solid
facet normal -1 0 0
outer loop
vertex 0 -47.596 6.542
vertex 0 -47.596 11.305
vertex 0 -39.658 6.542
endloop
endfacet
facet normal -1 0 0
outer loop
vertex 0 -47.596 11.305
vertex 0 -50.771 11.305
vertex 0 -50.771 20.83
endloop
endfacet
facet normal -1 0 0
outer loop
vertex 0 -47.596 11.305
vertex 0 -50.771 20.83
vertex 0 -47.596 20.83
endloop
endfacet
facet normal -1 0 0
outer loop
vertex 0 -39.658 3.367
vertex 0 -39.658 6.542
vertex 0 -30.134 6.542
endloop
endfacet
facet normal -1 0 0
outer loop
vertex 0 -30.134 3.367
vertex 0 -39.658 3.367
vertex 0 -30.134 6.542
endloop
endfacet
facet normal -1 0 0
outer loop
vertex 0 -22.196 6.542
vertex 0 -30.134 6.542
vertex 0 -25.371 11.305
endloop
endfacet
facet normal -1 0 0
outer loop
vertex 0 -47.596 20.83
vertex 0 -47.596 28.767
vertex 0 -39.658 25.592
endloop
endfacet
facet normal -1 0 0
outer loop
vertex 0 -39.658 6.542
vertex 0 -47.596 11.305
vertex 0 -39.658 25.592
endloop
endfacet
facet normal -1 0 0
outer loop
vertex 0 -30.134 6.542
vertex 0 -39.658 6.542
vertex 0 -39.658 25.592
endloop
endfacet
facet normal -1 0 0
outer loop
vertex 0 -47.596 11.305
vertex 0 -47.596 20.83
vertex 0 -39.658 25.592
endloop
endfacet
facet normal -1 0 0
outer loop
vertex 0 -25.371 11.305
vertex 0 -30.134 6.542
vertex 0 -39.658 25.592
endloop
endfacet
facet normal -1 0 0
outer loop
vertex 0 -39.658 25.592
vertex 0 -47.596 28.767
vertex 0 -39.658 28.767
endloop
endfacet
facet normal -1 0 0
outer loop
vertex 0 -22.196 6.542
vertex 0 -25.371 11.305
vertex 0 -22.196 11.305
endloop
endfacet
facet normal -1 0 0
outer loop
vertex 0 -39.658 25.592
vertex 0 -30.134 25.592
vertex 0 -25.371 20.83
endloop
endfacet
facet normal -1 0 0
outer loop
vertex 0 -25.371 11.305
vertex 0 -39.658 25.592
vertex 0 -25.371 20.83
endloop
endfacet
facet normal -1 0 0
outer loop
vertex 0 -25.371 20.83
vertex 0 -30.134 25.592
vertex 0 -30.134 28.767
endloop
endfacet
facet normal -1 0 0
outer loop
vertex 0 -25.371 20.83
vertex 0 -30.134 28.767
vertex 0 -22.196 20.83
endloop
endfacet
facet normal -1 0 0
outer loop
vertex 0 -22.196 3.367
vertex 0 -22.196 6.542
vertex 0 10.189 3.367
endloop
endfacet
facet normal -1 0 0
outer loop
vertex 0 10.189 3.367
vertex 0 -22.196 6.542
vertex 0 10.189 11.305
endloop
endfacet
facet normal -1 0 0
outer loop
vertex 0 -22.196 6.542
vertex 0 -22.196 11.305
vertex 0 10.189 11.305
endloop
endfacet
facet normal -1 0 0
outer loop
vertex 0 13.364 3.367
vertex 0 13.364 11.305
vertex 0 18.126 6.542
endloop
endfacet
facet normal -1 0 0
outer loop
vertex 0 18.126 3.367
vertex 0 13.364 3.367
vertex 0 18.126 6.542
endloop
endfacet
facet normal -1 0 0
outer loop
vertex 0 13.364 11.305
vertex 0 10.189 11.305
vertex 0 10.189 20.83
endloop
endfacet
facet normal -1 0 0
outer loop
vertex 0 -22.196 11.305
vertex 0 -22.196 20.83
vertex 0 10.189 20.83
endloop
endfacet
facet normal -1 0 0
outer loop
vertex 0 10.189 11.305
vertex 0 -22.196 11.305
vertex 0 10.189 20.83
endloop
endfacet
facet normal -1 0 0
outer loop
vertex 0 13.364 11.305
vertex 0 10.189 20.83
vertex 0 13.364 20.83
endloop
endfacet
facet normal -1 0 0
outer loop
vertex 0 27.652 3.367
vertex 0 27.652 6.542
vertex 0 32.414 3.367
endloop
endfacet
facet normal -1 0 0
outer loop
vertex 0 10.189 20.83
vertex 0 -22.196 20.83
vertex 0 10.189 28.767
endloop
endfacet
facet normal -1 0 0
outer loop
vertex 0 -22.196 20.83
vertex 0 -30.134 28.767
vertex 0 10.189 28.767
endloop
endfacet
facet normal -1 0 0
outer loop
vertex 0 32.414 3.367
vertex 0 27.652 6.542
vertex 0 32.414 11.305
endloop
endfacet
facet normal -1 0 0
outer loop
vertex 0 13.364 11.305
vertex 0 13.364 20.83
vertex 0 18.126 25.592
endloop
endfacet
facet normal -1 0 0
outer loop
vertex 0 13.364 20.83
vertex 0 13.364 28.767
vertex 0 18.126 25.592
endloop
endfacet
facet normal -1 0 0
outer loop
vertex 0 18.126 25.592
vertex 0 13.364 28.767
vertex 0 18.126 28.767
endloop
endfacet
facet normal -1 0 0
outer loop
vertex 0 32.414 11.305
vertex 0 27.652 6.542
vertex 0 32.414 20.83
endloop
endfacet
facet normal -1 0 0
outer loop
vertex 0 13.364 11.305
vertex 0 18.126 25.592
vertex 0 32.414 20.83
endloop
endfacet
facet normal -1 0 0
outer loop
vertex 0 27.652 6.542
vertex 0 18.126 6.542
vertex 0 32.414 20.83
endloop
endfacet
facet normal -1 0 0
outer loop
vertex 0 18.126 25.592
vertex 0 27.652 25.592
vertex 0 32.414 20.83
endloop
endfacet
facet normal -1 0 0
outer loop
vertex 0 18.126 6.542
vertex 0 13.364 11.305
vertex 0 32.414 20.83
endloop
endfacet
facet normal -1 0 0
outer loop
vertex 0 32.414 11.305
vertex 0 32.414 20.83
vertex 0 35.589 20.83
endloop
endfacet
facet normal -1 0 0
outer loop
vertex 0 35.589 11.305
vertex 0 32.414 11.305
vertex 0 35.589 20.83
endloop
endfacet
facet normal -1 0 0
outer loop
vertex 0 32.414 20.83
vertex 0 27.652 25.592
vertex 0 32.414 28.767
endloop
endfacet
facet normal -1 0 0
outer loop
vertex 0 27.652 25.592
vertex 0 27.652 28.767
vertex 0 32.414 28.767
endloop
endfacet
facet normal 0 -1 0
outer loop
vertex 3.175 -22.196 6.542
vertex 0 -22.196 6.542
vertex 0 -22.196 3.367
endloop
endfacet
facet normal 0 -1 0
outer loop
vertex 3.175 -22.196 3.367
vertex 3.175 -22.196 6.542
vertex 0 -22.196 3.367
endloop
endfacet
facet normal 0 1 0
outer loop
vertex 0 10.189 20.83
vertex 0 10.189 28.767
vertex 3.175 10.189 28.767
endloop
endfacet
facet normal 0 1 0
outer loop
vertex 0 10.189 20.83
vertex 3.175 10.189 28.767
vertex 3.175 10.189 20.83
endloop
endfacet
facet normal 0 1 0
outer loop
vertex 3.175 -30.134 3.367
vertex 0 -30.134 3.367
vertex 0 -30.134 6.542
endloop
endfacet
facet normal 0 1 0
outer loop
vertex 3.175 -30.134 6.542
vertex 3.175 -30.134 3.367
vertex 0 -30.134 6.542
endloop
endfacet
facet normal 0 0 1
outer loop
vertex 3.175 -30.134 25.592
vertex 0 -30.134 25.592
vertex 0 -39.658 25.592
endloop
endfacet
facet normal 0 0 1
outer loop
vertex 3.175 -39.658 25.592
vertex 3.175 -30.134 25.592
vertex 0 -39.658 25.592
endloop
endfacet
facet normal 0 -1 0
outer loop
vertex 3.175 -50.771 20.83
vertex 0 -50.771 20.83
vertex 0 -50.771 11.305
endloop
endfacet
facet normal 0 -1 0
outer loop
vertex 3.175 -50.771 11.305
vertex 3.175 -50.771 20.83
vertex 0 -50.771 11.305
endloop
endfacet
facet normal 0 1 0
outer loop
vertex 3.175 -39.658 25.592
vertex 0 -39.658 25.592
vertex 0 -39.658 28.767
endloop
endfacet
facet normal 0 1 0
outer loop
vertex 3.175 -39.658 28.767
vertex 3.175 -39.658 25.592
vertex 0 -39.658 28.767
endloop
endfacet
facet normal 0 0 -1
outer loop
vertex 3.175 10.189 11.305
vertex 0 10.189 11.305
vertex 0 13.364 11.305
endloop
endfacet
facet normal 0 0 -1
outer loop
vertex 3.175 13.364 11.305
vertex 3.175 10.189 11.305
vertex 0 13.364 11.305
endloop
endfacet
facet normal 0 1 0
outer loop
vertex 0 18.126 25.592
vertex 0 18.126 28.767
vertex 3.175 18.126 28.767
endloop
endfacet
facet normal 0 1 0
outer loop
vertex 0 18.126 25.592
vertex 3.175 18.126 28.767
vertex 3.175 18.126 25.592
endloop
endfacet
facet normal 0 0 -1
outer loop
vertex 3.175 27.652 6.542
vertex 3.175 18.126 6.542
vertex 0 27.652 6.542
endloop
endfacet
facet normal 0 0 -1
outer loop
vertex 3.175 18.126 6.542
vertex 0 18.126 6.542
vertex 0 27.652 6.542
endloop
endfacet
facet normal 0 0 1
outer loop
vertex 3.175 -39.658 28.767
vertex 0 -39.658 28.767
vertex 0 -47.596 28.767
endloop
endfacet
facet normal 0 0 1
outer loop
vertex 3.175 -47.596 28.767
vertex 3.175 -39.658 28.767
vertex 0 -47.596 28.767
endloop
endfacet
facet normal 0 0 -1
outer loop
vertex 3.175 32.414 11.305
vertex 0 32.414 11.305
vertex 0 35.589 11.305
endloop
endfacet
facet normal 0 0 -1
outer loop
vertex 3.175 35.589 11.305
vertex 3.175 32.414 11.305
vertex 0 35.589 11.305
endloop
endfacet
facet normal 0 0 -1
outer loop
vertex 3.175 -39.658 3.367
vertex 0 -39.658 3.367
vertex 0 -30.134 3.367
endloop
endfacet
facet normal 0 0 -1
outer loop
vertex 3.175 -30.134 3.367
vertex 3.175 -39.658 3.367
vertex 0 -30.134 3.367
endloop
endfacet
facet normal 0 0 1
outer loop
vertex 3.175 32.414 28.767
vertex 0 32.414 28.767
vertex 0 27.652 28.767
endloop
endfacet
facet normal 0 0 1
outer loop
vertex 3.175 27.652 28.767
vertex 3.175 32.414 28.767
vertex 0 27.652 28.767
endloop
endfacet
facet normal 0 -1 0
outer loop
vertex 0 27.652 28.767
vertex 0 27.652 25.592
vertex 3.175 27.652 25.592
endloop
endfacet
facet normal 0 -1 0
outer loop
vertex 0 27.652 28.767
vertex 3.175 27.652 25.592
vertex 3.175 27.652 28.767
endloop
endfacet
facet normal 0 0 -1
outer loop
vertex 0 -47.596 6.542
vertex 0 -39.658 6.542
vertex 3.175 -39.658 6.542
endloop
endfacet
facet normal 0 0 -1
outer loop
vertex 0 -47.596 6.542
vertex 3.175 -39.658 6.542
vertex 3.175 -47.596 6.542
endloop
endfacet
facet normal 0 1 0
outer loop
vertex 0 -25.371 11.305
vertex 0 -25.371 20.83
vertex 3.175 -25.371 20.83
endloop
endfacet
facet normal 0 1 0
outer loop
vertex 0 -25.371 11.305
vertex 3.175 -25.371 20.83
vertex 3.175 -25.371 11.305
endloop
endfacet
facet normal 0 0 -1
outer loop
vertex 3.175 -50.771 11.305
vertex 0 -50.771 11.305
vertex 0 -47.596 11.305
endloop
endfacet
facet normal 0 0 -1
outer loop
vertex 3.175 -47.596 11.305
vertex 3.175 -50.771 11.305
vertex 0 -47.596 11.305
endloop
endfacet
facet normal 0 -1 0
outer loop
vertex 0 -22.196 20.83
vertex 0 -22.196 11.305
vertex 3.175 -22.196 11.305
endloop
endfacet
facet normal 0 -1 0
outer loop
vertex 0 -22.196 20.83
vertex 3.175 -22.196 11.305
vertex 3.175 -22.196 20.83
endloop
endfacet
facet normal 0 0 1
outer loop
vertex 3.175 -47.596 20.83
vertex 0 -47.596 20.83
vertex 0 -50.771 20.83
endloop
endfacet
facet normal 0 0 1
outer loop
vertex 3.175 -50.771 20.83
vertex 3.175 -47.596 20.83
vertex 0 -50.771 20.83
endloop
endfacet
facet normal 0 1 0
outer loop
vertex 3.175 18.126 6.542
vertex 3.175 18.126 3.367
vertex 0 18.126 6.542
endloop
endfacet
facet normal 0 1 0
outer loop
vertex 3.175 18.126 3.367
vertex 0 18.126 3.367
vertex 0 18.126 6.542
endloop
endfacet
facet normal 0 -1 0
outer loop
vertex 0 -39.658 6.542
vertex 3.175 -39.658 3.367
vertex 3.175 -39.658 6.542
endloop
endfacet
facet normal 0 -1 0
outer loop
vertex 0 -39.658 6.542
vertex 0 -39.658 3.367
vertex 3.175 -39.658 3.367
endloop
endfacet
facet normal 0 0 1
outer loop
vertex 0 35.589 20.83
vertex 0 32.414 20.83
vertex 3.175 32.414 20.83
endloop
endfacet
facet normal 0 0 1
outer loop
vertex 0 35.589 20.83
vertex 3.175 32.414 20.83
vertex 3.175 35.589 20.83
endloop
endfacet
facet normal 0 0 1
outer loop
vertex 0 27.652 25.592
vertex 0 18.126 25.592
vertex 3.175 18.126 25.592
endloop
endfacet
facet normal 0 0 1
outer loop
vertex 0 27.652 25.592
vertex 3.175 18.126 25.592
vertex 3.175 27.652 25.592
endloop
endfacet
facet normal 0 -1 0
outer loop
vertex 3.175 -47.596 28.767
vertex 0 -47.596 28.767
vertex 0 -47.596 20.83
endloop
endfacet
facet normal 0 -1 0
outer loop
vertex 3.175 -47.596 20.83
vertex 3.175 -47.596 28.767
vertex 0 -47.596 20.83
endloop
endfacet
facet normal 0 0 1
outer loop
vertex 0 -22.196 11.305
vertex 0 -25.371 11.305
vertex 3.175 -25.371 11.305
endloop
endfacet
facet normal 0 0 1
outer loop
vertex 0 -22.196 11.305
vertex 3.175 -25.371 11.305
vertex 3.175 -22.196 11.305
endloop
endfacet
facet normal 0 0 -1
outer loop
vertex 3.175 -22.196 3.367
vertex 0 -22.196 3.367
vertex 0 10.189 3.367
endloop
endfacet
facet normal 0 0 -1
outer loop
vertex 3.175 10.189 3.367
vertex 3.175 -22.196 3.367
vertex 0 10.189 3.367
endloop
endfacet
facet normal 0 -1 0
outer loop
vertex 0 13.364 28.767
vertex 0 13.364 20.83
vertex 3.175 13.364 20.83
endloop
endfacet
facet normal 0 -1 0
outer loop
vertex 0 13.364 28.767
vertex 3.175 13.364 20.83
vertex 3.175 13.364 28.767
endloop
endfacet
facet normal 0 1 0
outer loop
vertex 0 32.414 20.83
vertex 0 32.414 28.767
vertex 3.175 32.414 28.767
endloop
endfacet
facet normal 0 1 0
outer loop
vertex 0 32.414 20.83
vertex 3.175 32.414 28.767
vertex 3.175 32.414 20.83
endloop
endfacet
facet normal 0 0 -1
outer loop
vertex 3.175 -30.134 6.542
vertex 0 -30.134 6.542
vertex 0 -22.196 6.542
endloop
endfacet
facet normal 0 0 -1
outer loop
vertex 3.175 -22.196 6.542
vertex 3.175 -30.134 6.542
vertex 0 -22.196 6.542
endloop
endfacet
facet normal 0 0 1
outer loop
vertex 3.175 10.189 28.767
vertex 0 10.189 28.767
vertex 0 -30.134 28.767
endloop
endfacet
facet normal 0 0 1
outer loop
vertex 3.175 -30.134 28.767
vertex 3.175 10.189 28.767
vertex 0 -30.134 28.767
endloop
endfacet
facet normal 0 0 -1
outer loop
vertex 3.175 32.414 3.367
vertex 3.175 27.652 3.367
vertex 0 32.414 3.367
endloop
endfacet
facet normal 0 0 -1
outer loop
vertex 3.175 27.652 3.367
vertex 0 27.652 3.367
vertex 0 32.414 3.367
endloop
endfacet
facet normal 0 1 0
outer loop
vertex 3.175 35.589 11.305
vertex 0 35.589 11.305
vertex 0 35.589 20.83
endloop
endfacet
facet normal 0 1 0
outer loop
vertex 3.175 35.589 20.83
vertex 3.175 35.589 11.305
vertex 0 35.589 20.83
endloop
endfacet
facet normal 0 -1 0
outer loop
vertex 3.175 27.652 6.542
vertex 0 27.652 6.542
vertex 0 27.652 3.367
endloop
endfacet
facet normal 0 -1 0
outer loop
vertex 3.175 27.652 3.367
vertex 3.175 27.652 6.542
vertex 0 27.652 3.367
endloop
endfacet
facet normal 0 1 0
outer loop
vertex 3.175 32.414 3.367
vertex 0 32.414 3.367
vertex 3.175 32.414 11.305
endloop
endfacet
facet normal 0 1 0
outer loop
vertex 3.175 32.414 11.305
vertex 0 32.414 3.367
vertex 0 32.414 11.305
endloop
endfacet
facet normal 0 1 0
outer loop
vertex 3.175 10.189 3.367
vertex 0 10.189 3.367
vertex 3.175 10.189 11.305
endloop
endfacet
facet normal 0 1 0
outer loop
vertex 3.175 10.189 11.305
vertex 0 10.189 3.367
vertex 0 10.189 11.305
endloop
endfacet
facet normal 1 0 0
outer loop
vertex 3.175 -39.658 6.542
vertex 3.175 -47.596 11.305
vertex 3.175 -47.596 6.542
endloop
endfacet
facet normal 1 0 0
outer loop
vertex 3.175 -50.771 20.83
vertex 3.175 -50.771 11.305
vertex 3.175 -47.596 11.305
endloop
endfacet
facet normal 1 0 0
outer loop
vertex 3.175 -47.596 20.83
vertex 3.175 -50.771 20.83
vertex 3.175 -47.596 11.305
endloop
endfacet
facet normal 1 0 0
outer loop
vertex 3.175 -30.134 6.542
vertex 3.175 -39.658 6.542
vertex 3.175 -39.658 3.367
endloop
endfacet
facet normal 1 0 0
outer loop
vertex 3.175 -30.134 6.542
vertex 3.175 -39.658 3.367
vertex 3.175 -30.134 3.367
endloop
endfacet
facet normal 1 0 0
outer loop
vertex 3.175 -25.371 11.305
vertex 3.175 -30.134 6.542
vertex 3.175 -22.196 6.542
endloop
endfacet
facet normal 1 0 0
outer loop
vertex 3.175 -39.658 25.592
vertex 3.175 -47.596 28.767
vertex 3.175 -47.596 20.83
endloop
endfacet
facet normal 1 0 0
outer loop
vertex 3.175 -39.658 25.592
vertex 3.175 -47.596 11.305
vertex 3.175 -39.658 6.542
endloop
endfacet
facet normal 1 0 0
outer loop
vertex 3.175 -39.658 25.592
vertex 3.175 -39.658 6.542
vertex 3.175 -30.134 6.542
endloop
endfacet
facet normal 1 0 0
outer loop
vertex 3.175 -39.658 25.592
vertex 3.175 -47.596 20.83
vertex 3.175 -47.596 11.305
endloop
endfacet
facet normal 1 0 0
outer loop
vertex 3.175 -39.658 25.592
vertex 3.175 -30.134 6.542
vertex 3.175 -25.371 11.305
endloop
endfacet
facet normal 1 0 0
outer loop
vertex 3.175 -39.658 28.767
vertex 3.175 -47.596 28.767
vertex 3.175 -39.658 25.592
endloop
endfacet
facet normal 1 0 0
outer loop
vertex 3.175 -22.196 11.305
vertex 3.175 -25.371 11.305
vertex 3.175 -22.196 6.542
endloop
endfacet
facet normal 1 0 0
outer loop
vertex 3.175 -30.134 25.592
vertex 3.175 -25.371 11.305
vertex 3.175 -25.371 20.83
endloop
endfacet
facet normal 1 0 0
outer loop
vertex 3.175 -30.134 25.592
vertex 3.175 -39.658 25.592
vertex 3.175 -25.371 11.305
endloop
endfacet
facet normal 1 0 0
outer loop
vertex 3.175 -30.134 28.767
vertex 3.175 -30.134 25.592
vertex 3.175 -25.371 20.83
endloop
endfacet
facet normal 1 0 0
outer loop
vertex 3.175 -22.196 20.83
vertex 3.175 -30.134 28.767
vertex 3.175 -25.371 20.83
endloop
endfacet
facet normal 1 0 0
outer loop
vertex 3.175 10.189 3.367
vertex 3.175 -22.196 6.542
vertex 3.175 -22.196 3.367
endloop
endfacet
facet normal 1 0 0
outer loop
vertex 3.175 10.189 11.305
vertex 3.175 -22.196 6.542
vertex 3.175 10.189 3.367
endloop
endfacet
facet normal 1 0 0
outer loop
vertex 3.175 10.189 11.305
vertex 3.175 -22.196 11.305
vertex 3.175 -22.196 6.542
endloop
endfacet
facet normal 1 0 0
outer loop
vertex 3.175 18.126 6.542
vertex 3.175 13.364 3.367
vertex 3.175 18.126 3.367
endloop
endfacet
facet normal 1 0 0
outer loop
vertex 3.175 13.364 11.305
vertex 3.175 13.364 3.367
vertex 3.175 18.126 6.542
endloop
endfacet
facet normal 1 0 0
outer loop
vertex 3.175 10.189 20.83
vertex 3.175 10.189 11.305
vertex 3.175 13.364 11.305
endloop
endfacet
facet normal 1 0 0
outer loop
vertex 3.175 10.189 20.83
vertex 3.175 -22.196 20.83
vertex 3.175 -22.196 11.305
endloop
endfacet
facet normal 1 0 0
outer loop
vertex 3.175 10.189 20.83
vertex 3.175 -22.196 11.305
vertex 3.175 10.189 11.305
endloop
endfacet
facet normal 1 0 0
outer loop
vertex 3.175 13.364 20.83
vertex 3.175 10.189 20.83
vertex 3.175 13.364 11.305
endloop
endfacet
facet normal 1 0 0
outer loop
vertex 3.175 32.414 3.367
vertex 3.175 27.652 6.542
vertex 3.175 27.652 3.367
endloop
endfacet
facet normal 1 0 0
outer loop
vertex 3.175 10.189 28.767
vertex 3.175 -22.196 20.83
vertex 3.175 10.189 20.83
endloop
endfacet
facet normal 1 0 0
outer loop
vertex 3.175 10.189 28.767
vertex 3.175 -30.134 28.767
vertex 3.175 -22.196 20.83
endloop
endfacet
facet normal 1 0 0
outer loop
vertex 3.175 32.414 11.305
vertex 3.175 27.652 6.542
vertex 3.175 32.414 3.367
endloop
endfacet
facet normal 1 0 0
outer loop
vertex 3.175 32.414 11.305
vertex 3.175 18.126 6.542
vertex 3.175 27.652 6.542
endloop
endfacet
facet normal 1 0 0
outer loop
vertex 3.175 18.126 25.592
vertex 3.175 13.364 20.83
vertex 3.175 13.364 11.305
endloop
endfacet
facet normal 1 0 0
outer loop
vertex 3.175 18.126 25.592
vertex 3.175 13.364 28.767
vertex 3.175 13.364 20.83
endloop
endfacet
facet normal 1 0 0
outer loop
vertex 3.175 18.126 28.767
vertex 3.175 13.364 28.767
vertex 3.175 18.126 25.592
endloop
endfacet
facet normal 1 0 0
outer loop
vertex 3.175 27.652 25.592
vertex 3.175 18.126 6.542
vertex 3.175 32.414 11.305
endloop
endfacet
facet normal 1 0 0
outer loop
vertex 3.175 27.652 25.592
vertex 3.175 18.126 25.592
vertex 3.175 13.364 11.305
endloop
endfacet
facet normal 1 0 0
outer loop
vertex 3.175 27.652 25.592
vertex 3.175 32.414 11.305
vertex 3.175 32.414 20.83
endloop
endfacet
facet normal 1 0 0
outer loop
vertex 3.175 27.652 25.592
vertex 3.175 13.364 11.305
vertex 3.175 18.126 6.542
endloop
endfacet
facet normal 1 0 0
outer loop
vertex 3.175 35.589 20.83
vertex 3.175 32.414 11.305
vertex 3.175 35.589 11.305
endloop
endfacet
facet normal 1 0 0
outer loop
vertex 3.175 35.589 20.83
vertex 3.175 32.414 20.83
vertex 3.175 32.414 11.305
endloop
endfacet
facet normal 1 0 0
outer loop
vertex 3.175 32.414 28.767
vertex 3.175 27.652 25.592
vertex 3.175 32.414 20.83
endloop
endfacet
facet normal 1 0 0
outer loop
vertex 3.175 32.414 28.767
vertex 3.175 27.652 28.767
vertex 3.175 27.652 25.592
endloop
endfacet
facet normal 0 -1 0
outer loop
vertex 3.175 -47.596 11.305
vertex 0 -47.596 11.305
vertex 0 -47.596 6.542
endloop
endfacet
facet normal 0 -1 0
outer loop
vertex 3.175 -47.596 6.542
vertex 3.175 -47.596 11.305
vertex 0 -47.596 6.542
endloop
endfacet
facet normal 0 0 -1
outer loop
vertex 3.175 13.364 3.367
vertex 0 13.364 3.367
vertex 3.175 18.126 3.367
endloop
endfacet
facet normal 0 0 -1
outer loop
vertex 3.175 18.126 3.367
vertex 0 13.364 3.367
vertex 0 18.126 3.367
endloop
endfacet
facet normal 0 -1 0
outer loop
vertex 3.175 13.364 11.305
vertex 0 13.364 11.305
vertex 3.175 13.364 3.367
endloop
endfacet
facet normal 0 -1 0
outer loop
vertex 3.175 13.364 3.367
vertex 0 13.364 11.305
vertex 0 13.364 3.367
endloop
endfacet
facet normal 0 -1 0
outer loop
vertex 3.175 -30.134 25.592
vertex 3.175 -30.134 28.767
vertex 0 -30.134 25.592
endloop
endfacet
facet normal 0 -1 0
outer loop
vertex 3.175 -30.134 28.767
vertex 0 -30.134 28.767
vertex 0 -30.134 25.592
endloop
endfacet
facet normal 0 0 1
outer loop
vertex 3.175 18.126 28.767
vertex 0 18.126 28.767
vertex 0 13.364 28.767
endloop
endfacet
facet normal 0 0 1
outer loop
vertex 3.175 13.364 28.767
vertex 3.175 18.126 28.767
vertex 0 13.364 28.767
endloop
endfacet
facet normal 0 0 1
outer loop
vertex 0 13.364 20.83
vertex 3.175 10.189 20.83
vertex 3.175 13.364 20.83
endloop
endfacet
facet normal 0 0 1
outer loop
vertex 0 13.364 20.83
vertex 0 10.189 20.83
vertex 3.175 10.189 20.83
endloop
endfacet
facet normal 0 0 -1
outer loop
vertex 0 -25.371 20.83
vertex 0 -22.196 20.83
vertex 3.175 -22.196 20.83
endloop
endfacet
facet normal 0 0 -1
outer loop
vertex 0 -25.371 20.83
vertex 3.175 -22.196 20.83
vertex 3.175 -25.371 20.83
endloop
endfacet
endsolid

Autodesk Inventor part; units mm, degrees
ref_plane "YZ Plane" through (0, 0, 0) normal (1, 0, 0) x (0, 1, 0)
ref_plane "XZ Plane" through (0, 0, 0) normal (0, 1, 0) x (-1, 0, 0)
ref_plane "XY Plane" through (0, 0, 0) normal (0, 0, 1) x (1, 0, 0)
sketch "Sketch1" plane through (0, 0, 0) normal (1, 0, 0) x (0, 1, 0)
  line L0 (35.589, 28.7672) -> (-47.596, 28.7672)
  line L1 (-47.596, 28.7672) -> (-47.596, 3.3672)
  line L2 (-47.596, 3.3672) -> (35.589, 3.3672)
  line L3 (35.589, 3.3672) -> (35.589, 28.7672)
  line L4 (-47.596, 20.8297) -> (-50.771, 20.8297)
  line L5 (-50.771, 20.8297) -> (-50.771, 11.3047)
  line L6 (-50.771, 11.3047) -> (-47.596, 11.3047)
  line L7 (-47.596, 11.3047) -> (-47.596, 20.8297)
  line L8 (-39.6585, 28.7672) -> (-30.1335, 28.7672)
  line L9 (-30.1335, 28.7672) -> (-30.1335, 25.5922)
  line L10 (-30.1335, 25.5922) -> (-39.6585, 25.5922)
  line L11 (-39.6585, 25.5922) -> (-39.6585, 28.7672)
  line L12 (-22.196, 20.8297) -> (-25.371, 20.8297)
  line L13 (-25.371, 20.8297) -> (-25.371, 11.3047)
  line L14 (-25.371, 11.3047) -> (-22.196, 11.3047)
  line L15 (-22.196, 11.3047) -> (-22.196, 20.8297)
  line L16 (-22.196, 3.3672) -> (-30.1335, 3.3672)
  line L17 (-30.1335, 3.3672) -> (-30.1335, 6.5422)
  line L18 (-30.1335, 6.5422) -> (-22.196, 6.5422)
  line L19 (-22.196, 6.5422) -> (-22.196, 3.3672)
  line L20 (-47.596, 3.3672) -> (-39.6585, 3.3672)
  line L21 (-39.6585, 3.3672) -> (-39.6585, 6.5422)
  line L22 (-39.6585, 6.5422) -> (-47.596, 6.5422)
  line L23 (-47.596, 6.5422) -> (-47.596, 3.3672)
  line L24 (35.589, 28.7672) -> (32.414, 28.7672)
  line L25 (32.414, 28.7672) -> (32.414, 20.8297)
  line L26 (32.414, 20.8297) -> (35.589, 20.8297)
  line L27 (35.589, 20.8297) -> (35.589, 28.7672)
  line L28 (35.589, 3.3672) -> (32.414, 3.3672)
  line L29 (32.414, 3.3672) -> (32.414, 11.3047)
  line L30 (32.414, 11.3047) -> (35.589, 11.3047)
  line L31 (35.589, 11.3047) -> (35.589, 3.3672)
  line L32 (27.6515, 3.3672) -> (18.1265, 3.3672)
  line L33 (18.1265, 3.3672) -> (18.1265, 6.5422)
  line L34 (18.1265, 6.5422) -> (27.6515, 6.5422)
  line L35 (27.6515, 6.5422) -> (27.6515, 3.3672)
  line L36 (27.6515, 28.7672) -> (18.1265, 28.7672)
  line L37 (18.1265, 28.7672) -> (18.1265, 25.5922)
  line L38 (18.1265, 25.5922) -> (27.6515, 25.5922)
  line L39 (27.6515, 25.5922) -> (27.6515, 28.7672)
  line L40 (13.364, 28.7672) -> (10.189, 28.7672)
  line L41 (10.189, 28.7672) -> (10.189, 20.8297)
  line L42 (10.189, 20.8297) -> (13.364, 20.8297)
  line L43 (13.364, 20.8297) -> (13.364, 28.7672)
  line L44 (13.364, 3.3672) -> (10.189, 3.3672)
  line L45 (10.189, 3.3672) -> (10.189, 11.3047)
  line L46 (10.189, 11.3047) -> (13.364, 11.3047)
  line L47 (13.364, 11.3047) -> (13.364, 3.3672)
  point P0 (0, 0)
  dimension "d0" = 25.4
  dimension "d1" = 3.175
  dimension "d2" = 7.9375
  dimension "d3" = 7.9375
  dimension "d4" = 83.185
  dimension "d5" = 3.175
  dimension "d6" = 9.525
  dimension "d7" = 7.9375
  dimension "d8" = 25.4
  dimension "d9" = 3.175
  dimension "d10" = 3.175
  dimension "d11" = 7.9375
  dimension "d12" = 3.175
  dimension "d13" = 7.9375
  dimension "d14" = 9.525
  dimension "d15" = 3.175
  dimension "d16" = 25.4
extrude "Extrusion1" add sketch "Sketch1" along normal blind 3.175 contours L25 L26 L3 L30 L29 L2 L35 L34 L33 L47 L46 L45 L19 L18 L17 L21 L22 L1 L0 L11 L10 L9 L41 L42 L43 L37 L38 L39 | L1 L6 L5 L4
